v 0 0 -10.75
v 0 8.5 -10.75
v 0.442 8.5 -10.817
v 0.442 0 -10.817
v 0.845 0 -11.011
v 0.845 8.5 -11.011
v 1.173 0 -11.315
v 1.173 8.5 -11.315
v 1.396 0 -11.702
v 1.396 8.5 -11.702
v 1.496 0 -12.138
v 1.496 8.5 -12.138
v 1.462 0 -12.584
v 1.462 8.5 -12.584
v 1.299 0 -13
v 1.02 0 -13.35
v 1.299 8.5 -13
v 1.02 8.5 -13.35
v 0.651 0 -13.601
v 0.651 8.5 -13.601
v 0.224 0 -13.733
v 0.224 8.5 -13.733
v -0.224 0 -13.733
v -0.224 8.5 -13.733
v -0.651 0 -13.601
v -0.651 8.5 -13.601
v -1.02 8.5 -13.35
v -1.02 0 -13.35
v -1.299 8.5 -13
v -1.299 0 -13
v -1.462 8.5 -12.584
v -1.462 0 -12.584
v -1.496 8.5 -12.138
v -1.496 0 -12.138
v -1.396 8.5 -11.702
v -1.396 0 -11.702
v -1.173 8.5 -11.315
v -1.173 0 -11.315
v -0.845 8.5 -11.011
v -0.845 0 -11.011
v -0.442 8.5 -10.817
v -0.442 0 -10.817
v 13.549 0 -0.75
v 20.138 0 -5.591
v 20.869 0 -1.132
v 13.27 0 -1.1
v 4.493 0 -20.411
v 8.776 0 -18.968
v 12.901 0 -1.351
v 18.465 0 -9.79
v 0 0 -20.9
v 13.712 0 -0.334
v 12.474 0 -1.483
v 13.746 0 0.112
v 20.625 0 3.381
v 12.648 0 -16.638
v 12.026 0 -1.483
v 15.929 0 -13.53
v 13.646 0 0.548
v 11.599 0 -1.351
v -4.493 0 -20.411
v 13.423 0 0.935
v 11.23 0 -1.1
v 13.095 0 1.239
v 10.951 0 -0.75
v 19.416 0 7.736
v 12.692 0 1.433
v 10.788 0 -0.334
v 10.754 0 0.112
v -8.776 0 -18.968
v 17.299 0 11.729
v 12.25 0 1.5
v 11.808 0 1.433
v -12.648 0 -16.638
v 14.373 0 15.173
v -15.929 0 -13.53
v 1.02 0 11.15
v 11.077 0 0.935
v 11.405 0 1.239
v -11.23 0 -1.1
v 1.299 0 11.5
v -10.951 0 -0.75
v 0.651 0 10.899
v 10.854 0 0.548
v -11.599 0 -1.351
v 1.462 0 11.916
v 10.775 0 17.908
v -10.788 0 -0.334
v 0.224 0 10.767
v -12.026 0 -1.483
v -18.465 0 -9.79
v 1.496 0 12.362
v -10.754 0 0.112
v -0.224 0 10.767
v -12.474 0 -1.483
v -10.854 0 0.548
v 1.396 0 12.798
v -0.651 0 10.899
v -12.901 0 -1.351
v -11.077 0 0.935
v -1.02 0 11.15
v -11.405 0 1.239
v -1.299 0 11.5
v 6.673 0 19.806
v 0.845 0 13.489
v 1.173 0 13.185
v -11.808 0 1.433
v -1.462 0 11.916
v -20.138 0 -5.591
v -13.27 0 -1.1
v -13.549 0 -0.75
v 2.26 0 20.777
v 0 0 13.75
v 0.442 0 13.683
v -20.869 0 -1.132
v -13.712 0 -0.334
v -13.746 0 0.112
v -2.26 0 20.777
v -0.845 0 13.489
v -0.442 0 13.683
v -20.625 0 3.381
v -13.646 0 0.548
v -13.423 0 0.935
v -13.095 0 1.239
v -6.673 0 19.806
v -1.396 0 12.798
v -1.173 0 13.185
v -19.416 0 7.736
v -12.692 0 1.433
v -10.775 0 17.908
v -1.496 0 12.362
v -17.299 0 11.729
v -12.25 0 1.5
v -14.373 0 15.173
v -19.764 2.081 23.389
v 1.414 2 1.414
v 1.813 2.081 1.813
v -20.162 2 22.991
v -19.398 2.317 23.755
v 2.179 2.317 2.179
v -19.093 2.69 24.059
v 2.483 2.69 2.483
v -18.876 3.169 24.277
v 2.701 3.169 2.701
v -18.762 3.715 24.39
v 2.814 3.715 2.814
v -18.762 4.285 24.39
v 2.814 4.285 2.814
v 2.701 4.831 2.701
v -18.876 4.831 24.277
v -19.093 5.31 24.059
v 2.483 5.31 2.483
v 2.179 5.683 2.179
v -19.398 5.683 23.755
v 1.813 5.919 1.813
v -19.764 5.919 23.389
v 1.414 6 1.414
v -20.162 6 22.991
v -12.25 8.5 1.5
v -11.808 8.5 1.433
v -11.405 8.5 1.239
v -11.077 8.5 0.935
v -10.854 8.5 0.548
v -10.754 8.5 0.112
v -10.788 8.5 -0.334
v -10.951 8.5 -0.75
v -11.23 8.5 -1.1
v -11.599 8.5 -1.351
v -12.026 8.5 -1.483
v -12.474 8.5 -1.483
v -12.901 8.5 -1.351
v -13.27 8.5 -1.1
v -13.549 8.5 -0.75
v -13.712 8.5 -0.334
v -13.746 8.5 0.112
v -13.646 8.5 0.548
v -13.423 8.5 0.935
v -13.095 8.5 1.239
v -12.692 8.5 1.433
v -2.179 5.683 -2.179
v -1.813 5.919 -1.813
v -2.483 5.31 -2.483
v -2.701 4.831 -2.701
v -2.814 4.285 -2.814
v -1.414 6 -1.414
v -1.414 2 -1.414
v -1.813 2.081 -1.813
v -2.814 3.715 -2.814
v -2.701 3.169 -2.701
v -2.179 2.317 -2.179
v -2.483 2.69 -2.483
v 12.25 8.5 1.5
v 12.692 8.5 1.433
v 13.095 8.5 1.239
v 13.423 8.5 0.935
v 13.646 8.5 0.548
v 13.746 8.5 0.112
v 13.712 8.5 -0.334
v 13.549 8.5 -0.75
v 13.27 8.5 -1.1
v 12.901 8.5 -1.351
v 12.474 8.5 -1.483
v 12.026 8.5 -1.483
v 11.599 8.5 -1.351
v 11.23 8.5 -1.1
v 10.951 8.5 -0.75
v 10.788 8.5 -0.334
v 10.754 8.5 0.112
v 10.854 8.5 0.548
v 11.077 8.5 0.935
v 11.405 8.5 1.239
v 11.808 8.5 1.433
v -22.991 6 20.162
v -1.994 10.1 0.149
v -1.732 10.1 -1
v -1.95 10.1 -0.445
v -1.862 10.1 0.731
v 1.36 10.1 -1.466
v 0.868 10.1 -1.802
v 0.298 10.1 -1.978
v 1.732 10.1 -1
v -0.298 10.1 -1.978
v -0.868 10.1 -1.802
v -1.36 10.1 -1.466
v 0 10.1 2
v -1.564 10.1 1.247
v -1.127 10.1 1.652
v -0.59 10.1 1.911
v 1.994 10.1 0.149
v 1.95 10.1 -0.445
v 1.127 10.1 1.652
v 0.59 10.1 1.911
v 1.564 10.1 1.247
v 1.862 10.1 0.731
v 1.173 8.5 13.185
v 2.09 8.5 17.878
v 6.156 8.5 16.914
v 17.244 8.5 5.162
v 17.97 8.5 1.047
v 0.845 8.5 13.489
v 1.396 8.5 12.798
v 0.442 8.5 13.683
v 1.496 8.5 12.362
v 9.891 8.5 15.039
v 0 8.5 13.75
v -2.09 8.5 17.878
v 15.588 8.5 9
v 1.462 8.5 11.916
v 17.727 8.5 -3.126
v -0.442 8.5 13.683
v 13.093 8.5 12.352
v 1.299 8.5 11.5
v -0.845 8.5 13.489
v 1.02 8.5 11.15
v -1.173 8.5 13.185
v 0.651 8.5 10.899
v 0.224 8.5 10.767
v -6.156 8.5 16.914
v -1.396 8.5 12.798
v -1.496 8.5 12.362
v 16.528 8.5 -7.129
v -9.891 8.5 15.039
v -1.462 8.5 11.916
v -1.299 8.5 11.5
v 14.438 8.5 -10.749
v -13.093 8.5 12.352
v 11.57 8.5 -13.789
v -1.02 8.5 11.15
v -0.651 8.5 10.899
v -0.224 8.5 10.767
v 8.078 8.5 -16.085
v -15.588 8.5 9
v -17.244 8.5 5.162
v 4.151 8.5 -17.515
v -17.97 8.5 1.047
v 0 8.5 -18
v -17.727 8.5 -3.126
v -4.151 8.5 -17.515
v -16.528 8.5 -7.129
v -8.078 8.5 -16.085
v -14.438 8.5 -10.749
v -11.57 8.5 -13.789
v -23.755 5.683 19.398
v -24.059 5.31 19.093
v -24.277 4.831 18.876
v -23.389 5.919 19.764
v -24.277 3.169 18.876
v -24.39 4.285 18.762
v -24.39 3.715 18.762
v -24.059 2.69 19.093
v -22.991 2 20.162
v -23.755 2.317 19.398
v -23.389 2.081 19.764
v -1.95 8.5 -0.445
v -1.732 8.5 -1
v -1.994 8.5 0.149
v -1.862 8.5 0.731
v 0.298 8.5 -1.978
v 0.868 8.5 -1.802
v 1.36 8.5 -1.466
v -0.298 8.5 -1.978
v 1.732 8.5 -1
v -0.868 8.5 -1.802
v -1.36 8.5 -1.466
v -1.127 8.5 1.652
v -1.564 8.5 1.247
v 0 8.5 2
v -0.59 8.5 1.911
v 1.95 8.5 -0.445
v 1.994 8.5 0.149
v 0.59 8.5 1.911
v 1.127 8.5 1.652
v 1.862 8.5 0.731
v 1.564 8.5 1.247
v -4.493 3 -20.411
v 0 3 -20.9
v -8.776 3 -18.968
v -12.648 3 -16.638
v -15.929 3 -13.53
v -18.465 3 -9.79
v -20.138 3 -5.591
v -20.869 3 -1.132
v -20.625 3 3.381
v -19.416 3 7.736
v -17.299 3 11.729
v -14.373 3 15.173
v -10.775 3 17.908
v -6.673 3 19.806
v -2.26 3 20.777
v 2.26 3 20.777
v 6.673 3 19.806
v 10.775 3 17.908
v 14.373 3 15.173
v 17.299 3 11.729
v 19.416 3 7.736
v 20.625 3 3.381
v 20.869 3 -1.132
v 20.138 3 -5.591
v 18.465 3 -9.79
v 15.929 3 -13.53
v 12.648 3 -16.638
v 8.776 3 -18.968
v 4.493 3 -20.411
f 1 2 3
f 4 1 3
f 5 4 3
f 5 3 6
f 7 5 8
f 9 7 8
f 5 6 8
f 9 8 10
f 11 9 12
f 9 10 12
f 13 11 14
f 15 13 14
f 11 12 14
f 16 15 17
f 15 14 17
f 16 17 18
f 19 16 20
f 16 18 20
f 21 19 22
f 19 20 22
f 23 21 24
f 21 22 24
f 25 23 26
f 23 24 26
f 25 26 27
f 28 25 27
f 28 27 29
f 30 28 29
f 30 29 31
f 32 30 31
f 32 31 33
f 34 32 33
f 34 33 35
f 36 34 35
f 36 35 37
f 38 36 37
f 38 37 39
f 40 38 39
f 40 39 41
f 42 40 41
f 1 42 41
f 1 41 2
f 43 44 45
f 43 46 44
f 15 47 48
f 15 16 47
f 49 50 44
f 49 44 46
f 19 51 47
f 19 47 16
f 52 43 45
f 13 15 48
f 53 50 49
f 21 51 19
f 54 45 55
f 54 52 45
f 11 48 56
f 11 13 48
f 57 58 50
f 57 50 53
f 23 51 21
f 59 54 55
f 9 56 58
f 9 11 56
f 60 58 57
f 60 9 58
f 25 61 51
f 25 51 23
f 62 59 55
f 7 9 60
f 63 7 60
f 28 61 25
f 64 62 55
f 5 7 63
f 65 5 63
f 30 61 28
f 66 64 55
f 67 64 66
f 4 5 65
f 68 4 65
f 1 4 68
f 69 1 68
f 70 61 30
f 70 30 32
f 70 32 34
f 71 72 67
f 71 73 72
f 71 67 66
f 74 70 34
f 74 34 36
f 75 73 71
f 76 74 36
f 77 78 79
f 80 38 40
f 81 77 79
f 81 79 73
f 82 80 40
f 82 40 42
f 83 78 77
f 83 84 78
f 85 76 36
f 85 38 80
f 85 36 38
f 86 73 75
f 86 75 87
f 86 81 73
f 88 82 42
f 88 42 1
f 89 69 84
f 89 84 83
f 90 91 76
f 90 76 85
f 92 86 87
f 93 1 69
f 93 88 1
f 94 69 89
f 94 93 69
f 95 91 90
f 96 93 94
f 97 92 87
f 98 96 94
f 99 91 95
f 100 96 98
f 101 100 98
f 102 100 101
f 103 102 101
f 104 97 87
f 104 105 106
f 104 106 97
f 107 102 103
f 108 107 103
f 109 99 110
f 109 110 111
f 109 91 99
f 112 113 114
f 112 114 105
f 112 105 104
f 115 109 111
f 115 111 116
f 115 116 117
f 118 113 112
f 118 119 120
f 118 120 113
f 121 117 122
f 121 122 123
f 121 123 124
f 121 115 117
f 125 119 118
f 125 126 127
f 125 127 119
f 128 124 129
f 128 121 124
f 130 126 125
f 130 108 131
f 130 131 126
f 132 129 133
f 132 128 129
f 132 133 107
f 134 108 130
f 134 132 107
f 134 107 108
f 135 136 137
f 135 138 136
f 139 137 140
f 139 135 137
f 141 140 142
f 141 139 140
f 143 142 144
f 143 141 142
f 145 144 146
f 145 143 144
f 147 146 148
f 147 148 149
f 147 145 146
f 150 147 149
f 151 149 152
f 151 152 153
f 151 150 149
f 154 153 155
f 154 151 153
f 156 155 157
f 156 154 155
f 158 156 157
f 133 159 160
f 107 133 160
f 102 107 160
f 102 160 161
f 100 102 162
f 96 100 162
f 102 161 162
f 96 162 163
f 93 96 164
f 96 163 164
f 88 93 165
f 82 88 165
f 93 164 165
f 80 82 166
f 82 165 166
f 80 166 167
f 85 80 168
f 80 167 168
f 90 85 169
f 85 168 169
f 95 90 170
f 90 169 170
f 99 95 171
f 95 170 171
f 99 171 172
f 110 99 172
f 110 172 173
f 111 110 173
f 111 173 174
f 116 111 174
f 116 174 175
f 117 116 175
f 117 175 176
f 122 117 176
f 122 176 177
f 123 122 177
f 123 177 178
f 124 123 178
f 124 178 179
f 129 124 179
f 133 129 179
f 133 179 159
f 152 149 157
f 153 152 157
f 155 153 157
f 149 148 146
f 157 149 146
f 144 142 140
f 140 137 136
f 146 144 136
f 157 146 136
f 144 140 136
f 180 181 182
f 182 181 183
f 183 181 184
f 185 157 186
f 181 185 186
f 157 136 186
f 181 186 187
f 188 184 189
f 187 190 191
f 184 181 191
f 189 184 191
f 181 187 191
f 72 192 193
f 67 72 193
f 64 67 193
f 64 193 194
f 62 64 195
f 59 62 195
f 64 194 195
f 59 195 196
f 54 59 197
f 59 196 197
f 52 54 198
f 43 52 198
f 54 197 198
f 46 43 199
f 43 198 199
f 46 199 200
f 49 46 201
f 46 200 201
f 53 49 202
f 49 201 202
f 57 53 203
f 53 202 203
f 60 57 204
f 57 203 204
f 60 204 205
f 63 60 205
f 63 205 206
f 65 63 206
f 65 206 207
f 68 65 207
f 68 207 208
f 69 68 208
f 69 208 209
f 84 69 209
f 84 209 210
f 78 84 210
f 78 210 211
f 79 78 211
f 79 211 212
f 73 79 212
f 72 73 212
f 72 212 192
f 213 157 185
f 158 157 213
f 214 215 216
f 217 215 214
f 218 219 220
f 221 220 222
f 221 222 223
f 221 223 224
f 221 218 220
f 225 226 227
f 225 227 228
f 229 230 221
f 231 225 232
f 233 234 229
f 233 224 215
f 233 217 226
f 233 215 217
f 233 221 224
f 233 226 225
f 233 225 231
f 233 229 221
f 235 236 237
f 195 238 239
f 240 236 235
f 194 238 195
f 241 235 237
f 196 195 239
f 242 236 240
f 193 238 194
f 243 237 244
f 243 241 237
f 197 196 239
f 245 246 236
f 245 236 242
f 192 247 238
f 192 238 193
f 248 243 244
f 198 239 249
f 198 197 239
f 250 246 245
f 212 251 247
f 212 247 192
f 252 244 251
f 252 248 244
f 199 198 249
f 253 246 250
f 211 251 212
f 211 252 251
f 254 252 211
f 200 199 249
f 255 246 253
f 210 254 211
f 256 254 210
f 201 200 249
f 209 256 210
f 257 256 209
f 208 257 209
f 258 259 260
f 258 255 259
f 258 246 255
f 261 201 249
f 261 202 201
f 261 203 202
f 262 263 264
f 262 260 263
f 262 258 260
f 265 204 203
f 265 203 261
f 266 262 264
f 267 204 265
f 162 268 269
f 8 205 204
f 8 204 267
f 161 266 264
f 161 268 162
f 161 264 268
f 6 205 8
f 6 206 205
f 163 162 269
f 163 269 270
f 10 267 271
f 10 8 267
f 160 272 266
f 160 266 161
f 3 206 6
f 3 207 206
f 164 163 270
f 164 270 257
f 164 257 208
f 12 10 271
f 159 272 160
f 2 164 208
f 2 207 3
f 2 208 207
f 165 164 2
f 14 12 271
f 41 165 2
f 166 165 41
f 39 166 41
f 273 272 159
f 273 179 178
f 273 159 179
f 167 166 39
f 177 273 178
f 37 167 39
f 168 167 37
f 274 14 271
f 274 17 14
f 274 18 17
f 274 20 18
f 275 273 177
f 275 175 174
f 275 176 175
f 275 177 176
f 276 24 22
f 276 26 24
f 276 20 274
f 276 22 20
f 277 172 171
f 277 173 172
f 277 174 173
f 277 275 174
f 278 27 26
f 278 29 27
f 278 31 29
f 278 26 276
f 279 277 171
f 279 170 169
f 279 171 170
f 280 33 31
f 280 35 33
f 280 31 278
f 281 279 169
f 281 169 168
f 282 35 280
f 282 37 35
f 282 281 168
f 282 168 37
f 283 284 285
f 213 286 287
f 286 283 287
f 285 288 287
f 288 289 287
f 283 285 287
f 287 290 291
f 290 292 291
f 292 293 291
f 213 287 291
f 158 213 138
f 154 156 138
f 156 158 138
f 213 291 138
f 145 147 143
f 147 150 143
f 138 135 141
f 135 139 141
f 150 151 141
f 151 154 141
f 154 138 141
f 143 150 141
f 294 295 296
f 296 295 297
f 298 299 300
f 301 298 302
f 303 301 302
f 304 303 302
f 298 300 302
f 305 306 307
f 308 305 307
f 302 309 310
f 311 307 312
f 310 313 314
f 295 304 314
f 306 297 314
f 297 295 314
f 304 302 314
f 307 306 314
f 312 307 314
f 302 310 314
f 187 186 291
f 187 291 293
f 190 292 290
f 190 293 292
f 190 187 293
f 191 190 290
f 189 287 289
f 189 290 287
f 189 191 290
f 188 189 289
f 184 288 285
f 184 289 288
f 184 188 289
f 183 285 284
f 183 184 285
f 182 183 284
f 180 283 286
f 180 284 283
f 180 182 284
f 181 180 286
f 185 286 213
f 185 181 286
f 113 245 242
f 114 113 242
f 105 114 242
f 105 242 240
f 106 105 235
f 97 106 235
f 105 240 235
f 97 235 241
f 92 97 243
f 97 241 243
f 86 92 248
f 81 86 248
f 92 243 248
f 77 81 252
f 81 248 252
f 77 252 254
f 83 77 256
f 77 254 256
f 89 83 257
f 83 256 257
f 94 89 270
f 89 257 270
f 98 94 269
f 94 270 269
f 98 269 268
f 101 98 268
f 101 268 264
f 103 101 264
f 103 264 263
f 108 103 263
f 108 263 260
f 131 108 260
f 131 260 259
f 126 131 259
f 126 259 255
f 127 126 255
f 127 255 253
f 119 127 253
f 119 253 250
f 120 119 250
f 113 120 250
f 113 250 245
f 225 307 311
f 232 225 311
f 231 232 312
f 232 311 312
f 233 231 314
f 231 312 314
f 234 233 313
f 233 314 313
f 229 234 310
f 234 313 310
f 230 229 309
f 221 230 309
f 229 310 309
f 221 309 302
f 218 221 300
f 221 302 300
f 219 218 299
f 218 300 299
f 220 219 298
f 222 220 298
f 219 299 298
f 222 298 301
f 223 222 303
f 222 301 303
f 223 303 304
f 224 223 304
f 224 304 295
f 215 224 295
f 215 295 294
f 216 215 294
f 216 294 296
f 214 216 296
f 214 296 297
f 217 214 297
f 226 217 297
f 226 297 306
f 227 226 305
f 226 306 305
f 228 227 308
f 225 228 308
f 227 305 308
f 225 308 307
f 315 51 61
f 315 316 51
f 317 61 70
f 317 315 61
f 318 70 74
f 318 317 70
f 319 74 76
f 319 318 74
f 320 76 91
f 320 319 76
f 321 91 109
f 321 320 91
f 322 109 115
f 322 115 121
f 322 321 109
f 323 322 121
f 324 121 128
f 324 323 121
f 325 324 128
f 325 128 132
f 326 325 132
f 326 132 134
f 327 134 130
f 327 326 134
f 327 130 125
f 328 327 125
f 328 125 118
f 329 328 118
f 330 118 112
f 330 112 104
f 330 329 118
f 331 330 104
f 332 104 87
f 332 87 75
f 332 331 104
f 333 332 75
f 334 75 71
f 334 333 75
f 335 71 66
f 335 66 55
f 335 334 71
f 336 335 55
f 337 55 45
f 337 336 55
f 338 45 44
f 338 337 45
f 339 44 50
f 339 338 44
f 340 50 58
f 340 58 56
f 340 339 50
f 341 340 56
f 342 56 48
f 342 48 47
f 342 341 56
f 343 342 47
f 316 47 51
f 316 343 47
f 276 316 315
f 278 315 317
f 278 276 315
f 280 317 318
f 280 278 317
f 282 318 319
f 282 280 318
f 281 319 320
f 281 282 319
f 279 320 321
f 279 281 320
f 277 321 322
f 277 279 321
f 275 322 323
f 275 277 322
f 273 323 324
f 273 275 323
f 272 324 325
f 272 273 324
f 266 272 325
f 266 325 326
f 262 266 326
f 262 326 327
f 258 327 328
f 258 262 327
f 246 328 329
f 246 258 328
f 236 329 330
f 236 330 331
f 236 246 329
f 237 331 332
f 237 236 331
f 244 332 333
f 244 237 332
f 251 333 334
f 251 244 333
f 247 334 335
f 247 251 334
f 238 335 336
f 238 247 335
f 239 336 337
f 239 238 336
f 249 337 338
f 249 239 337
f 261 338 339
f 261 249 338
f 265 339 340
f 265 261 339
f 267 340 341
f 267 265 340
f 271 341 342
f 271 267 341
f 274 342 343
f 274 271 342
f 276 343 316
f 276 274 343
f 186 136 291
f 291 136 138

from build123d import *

# Parameters (mm, degrees)
ENL_V_MAT_EXTRU_1_REACH = 32.755
ESQUISSE4_R             = 1.5
ESQUISSE5_R             = 2
BOSS_EXTRU_2_DEPTH      = 1.6
BOSS_EXTRU_4_START      = -2
BOSS_EXTRU_4_DEPTH      = 4
CONG_3_RADIUS           = 2
CONG_3_LENGTH           = 30.513653989
CONG_2_RADIUS           = 2
CONG_2_LENGTH           = 30.513653989


with BuildPart() as part:
    # Esquisse3 → Révolution1 (revolve)
    with BuildSketch(Plane.XY, mode=Mode.PRIVATE) as r_volution1_sk:
        Polygon((-20.9, 0), (-20.9, 3), (-18, 8.5), (0, 8.5), (0, 0), align=None)
    revolve(r_volution1_sk.sketch.rotate(Axis((0, 0, 0), (0, 1, 0)), 270), axis=Axis((0, 0, 0), (0, 1, 0)))

    # Esquisse4 → Enlèv. mat.-Extru.1 (cut, up to next)
    with BuildSketch(Plane(origin=(0, 8.5, 0), x_dir=(1, 0, 0), z_dir=(0, 1, 0)), mode=Mode.PRIVATE) as enl_v_mat_extru_1_sk1:
        with Locations(Location((12.25, 0, 0), (0, 0, 270))):
            Circle(ESQUISSE4_R)
    enl_v_mat_extru_1_tool1 = extrude(enl_v_mat_extru_1_sk1.sketch, amount=-ENL_V_MAT_EXTRU_1_REACH, mode=Mode.PRIVATE) & part.part
    # Esquisse4 → Enlèv. mat.-Extru.1 (cut, up to next)
    with BuildSketch(Plane(origin=(0, 8.5, 0), x_dir=(1, 0, 0), z_dir=(0, 1, 0)), mode=Mode.PRIVATE) as enl_v_mat_extru_1_sk2:
        with Locations(Location((-12.25, 0, 0), (0, 0, 270))):
            Circle(ESQUISSE4_R)
    enl_v_mat_extru_1_tool2 = extrude(enl_v_mat_extru_1_sk2.sketch, amount=-ENL_V_MAT_EXTRU_1_REACH, mode=Mode.PRIVATE) & part.part
    # Esquisse4 → Enlèv. mat.-Extru.1 (cut, up to next)
    with BuildSketch(Plane(origin=(0, 8.5, 0), x_dir=(1, 0, 0), z_dir=(0, 1, 0)), mode=Mode.PRIVATE) as enl_v_mat_extru_1_sk3:
        with Locations(Location((0, -12.25, 0), (0, 0, 270))):
            Circle(ESQUISSE4_R)
    enl_v_mat_extru_1_tool3 = extrude(enl_v_mat_extru_1_sk3.sketch, amount=-ENL_V_MAT_EXTRU_1_REACH, mode=Mode.PRIVATE) & part.part
    # Esquisse4 → Enlèv. mat.-Extru.1 (cut, up to next)
    with BuildSketch(Plane(origin=(0, 8.5, 0), x_dir=(1, 0, 0), z_dir=(0, 1, 0)), mode=Mode.PRIVATE) as enl_v_mat_extru_1_sk4:
        with Locations(Location((0, 12.25, 0), (0, 0, 270))):
            Circle(ESQUISSE4_R)
    enl_v_mat_extru_1_tool4 = extrude(enl_v_mat_extru_1_sk4.sketch, amount=-ENL_V_MAT_EXTRU_1_REACH, mode=Mode.PRIVATE) & part.part
    add(enl_v_mat_extru_1_tool1.solids().sort_by_distance((12.25, 8.5, 0))[0], mode=Mode.SUBTRACT)
    add(enl_v_mat_extru_1_tool2.solids().sort_by_distance((-12.25, 8.5, 0))[0], mode=Mode.SUBTRACT)
    add(enl_v_mat_extru_1_tool3.solids().sort_by_distance((0, 8.5, 12.25))[0], mode=Mode.SUBTRACT)
    add(enl_v_mat_extru_1_tool4.solids().sort_by_distance((0, 8.5, -12.25))[0], mode=Mode.SUBTRACT)


with BuildPart() as body_2:
    # Esquisse5 → Boss.-Extru.2 (new body)
    with BuildSketch(Plane(origin=(0, 8.5, 0), x_dir=(1, 0, 0), z_dir=(0, 1, 0))):
        with Locations(Location((0, 0, 0), (0, 0, 270))):
            Circle(ESQUISSE5_R)
    extrude(amount=BOSS_EXTRU_2_DEPTH)


with BuildPart() as body_3:
    # Esquisse6 → Boss.-Extru.4 (new body)
    with BuildSketch(Plane.XZ.offset(BOSS_EXTRU_4_START)):
        Polygon((-24.404838779, 18.74798453), (-18.74798453, 24.404838779), (2.828427125, 2.828427125), (-2.828427125, -2.828427125), align=None)
    extrude(amount=-BOSS_EXTRU_4_DEPTH)

    # Congé3: full round fillet: the end face becomes a half cylinder, R = half its width
    cong_3_face = Plane((-7.959778703, 4, 13.616632952), x_dir=(-0.707106781187, 0, 0.707106781187), z_dir=(0.707106781187, 0, 0.707106781187))  # on the end face: x along it, z out of the body
    cong_3_slab = cong_3_face.offset(-CONG_3_RADIUS / 2) * Box(CONG_3_LENGTH, 2 * CONG_3_RADIUS, CONG_3_RADIUS, mode=Mode.PRIVATE)  # the body's end, R deep
    cong_3_round = Plane((-9.373992265, 4, 12.20241939), x_dir=(0.707106781187, 0, 0.707106781187), z_dir=(-0.707106781187, 0, 0.707106781187)) * Cylinder(CONG_3_RADIUS, CONG_3_LENGTH, mode=Mode.PRIVATE)  # its axis R under the face
    add(cong_3_slab - cong_3_round, mode=Mode.SUBTRACT)

    # Congé2: full round fillet: the end face becomes a half cylinder, R = half its width
    cong_2_face = Plane((-13.616632952, 4, 7.959778703), x_dir=(0.707106781187, 0, -0.707106781187), z_dir=(-0.707106781187, 0, -0.707106781187))  # on the end face: x along it, z out of the body
    cong_2_slab = cong_2_face.offset(-CONG_2_RADIUS / 2) * Box(CONG_2_LENGTH, 2 * CONG_2_RADIUS, CONG_2_RADIUS, mode=Mode.PRIVATE)  # the body's end, R deep
    cong_2_round = Plane((-12.20241939, 4, 9.373992265), x_dir=(-0.707106781187, 0, -0.707106781187), z_dir=(0.707106781187, 0, -0.707106781187)) * Cylinder(CONG_2_RADIUS, CONG_2_LENGTH, mode=Mode.PRIVATE)  # its axis R under the face
    add(cong_2_slab - cong_2_round, mode=Mode.SUBTRACT)


solid = Compound([part.part, body_2.part, body_3.part])
